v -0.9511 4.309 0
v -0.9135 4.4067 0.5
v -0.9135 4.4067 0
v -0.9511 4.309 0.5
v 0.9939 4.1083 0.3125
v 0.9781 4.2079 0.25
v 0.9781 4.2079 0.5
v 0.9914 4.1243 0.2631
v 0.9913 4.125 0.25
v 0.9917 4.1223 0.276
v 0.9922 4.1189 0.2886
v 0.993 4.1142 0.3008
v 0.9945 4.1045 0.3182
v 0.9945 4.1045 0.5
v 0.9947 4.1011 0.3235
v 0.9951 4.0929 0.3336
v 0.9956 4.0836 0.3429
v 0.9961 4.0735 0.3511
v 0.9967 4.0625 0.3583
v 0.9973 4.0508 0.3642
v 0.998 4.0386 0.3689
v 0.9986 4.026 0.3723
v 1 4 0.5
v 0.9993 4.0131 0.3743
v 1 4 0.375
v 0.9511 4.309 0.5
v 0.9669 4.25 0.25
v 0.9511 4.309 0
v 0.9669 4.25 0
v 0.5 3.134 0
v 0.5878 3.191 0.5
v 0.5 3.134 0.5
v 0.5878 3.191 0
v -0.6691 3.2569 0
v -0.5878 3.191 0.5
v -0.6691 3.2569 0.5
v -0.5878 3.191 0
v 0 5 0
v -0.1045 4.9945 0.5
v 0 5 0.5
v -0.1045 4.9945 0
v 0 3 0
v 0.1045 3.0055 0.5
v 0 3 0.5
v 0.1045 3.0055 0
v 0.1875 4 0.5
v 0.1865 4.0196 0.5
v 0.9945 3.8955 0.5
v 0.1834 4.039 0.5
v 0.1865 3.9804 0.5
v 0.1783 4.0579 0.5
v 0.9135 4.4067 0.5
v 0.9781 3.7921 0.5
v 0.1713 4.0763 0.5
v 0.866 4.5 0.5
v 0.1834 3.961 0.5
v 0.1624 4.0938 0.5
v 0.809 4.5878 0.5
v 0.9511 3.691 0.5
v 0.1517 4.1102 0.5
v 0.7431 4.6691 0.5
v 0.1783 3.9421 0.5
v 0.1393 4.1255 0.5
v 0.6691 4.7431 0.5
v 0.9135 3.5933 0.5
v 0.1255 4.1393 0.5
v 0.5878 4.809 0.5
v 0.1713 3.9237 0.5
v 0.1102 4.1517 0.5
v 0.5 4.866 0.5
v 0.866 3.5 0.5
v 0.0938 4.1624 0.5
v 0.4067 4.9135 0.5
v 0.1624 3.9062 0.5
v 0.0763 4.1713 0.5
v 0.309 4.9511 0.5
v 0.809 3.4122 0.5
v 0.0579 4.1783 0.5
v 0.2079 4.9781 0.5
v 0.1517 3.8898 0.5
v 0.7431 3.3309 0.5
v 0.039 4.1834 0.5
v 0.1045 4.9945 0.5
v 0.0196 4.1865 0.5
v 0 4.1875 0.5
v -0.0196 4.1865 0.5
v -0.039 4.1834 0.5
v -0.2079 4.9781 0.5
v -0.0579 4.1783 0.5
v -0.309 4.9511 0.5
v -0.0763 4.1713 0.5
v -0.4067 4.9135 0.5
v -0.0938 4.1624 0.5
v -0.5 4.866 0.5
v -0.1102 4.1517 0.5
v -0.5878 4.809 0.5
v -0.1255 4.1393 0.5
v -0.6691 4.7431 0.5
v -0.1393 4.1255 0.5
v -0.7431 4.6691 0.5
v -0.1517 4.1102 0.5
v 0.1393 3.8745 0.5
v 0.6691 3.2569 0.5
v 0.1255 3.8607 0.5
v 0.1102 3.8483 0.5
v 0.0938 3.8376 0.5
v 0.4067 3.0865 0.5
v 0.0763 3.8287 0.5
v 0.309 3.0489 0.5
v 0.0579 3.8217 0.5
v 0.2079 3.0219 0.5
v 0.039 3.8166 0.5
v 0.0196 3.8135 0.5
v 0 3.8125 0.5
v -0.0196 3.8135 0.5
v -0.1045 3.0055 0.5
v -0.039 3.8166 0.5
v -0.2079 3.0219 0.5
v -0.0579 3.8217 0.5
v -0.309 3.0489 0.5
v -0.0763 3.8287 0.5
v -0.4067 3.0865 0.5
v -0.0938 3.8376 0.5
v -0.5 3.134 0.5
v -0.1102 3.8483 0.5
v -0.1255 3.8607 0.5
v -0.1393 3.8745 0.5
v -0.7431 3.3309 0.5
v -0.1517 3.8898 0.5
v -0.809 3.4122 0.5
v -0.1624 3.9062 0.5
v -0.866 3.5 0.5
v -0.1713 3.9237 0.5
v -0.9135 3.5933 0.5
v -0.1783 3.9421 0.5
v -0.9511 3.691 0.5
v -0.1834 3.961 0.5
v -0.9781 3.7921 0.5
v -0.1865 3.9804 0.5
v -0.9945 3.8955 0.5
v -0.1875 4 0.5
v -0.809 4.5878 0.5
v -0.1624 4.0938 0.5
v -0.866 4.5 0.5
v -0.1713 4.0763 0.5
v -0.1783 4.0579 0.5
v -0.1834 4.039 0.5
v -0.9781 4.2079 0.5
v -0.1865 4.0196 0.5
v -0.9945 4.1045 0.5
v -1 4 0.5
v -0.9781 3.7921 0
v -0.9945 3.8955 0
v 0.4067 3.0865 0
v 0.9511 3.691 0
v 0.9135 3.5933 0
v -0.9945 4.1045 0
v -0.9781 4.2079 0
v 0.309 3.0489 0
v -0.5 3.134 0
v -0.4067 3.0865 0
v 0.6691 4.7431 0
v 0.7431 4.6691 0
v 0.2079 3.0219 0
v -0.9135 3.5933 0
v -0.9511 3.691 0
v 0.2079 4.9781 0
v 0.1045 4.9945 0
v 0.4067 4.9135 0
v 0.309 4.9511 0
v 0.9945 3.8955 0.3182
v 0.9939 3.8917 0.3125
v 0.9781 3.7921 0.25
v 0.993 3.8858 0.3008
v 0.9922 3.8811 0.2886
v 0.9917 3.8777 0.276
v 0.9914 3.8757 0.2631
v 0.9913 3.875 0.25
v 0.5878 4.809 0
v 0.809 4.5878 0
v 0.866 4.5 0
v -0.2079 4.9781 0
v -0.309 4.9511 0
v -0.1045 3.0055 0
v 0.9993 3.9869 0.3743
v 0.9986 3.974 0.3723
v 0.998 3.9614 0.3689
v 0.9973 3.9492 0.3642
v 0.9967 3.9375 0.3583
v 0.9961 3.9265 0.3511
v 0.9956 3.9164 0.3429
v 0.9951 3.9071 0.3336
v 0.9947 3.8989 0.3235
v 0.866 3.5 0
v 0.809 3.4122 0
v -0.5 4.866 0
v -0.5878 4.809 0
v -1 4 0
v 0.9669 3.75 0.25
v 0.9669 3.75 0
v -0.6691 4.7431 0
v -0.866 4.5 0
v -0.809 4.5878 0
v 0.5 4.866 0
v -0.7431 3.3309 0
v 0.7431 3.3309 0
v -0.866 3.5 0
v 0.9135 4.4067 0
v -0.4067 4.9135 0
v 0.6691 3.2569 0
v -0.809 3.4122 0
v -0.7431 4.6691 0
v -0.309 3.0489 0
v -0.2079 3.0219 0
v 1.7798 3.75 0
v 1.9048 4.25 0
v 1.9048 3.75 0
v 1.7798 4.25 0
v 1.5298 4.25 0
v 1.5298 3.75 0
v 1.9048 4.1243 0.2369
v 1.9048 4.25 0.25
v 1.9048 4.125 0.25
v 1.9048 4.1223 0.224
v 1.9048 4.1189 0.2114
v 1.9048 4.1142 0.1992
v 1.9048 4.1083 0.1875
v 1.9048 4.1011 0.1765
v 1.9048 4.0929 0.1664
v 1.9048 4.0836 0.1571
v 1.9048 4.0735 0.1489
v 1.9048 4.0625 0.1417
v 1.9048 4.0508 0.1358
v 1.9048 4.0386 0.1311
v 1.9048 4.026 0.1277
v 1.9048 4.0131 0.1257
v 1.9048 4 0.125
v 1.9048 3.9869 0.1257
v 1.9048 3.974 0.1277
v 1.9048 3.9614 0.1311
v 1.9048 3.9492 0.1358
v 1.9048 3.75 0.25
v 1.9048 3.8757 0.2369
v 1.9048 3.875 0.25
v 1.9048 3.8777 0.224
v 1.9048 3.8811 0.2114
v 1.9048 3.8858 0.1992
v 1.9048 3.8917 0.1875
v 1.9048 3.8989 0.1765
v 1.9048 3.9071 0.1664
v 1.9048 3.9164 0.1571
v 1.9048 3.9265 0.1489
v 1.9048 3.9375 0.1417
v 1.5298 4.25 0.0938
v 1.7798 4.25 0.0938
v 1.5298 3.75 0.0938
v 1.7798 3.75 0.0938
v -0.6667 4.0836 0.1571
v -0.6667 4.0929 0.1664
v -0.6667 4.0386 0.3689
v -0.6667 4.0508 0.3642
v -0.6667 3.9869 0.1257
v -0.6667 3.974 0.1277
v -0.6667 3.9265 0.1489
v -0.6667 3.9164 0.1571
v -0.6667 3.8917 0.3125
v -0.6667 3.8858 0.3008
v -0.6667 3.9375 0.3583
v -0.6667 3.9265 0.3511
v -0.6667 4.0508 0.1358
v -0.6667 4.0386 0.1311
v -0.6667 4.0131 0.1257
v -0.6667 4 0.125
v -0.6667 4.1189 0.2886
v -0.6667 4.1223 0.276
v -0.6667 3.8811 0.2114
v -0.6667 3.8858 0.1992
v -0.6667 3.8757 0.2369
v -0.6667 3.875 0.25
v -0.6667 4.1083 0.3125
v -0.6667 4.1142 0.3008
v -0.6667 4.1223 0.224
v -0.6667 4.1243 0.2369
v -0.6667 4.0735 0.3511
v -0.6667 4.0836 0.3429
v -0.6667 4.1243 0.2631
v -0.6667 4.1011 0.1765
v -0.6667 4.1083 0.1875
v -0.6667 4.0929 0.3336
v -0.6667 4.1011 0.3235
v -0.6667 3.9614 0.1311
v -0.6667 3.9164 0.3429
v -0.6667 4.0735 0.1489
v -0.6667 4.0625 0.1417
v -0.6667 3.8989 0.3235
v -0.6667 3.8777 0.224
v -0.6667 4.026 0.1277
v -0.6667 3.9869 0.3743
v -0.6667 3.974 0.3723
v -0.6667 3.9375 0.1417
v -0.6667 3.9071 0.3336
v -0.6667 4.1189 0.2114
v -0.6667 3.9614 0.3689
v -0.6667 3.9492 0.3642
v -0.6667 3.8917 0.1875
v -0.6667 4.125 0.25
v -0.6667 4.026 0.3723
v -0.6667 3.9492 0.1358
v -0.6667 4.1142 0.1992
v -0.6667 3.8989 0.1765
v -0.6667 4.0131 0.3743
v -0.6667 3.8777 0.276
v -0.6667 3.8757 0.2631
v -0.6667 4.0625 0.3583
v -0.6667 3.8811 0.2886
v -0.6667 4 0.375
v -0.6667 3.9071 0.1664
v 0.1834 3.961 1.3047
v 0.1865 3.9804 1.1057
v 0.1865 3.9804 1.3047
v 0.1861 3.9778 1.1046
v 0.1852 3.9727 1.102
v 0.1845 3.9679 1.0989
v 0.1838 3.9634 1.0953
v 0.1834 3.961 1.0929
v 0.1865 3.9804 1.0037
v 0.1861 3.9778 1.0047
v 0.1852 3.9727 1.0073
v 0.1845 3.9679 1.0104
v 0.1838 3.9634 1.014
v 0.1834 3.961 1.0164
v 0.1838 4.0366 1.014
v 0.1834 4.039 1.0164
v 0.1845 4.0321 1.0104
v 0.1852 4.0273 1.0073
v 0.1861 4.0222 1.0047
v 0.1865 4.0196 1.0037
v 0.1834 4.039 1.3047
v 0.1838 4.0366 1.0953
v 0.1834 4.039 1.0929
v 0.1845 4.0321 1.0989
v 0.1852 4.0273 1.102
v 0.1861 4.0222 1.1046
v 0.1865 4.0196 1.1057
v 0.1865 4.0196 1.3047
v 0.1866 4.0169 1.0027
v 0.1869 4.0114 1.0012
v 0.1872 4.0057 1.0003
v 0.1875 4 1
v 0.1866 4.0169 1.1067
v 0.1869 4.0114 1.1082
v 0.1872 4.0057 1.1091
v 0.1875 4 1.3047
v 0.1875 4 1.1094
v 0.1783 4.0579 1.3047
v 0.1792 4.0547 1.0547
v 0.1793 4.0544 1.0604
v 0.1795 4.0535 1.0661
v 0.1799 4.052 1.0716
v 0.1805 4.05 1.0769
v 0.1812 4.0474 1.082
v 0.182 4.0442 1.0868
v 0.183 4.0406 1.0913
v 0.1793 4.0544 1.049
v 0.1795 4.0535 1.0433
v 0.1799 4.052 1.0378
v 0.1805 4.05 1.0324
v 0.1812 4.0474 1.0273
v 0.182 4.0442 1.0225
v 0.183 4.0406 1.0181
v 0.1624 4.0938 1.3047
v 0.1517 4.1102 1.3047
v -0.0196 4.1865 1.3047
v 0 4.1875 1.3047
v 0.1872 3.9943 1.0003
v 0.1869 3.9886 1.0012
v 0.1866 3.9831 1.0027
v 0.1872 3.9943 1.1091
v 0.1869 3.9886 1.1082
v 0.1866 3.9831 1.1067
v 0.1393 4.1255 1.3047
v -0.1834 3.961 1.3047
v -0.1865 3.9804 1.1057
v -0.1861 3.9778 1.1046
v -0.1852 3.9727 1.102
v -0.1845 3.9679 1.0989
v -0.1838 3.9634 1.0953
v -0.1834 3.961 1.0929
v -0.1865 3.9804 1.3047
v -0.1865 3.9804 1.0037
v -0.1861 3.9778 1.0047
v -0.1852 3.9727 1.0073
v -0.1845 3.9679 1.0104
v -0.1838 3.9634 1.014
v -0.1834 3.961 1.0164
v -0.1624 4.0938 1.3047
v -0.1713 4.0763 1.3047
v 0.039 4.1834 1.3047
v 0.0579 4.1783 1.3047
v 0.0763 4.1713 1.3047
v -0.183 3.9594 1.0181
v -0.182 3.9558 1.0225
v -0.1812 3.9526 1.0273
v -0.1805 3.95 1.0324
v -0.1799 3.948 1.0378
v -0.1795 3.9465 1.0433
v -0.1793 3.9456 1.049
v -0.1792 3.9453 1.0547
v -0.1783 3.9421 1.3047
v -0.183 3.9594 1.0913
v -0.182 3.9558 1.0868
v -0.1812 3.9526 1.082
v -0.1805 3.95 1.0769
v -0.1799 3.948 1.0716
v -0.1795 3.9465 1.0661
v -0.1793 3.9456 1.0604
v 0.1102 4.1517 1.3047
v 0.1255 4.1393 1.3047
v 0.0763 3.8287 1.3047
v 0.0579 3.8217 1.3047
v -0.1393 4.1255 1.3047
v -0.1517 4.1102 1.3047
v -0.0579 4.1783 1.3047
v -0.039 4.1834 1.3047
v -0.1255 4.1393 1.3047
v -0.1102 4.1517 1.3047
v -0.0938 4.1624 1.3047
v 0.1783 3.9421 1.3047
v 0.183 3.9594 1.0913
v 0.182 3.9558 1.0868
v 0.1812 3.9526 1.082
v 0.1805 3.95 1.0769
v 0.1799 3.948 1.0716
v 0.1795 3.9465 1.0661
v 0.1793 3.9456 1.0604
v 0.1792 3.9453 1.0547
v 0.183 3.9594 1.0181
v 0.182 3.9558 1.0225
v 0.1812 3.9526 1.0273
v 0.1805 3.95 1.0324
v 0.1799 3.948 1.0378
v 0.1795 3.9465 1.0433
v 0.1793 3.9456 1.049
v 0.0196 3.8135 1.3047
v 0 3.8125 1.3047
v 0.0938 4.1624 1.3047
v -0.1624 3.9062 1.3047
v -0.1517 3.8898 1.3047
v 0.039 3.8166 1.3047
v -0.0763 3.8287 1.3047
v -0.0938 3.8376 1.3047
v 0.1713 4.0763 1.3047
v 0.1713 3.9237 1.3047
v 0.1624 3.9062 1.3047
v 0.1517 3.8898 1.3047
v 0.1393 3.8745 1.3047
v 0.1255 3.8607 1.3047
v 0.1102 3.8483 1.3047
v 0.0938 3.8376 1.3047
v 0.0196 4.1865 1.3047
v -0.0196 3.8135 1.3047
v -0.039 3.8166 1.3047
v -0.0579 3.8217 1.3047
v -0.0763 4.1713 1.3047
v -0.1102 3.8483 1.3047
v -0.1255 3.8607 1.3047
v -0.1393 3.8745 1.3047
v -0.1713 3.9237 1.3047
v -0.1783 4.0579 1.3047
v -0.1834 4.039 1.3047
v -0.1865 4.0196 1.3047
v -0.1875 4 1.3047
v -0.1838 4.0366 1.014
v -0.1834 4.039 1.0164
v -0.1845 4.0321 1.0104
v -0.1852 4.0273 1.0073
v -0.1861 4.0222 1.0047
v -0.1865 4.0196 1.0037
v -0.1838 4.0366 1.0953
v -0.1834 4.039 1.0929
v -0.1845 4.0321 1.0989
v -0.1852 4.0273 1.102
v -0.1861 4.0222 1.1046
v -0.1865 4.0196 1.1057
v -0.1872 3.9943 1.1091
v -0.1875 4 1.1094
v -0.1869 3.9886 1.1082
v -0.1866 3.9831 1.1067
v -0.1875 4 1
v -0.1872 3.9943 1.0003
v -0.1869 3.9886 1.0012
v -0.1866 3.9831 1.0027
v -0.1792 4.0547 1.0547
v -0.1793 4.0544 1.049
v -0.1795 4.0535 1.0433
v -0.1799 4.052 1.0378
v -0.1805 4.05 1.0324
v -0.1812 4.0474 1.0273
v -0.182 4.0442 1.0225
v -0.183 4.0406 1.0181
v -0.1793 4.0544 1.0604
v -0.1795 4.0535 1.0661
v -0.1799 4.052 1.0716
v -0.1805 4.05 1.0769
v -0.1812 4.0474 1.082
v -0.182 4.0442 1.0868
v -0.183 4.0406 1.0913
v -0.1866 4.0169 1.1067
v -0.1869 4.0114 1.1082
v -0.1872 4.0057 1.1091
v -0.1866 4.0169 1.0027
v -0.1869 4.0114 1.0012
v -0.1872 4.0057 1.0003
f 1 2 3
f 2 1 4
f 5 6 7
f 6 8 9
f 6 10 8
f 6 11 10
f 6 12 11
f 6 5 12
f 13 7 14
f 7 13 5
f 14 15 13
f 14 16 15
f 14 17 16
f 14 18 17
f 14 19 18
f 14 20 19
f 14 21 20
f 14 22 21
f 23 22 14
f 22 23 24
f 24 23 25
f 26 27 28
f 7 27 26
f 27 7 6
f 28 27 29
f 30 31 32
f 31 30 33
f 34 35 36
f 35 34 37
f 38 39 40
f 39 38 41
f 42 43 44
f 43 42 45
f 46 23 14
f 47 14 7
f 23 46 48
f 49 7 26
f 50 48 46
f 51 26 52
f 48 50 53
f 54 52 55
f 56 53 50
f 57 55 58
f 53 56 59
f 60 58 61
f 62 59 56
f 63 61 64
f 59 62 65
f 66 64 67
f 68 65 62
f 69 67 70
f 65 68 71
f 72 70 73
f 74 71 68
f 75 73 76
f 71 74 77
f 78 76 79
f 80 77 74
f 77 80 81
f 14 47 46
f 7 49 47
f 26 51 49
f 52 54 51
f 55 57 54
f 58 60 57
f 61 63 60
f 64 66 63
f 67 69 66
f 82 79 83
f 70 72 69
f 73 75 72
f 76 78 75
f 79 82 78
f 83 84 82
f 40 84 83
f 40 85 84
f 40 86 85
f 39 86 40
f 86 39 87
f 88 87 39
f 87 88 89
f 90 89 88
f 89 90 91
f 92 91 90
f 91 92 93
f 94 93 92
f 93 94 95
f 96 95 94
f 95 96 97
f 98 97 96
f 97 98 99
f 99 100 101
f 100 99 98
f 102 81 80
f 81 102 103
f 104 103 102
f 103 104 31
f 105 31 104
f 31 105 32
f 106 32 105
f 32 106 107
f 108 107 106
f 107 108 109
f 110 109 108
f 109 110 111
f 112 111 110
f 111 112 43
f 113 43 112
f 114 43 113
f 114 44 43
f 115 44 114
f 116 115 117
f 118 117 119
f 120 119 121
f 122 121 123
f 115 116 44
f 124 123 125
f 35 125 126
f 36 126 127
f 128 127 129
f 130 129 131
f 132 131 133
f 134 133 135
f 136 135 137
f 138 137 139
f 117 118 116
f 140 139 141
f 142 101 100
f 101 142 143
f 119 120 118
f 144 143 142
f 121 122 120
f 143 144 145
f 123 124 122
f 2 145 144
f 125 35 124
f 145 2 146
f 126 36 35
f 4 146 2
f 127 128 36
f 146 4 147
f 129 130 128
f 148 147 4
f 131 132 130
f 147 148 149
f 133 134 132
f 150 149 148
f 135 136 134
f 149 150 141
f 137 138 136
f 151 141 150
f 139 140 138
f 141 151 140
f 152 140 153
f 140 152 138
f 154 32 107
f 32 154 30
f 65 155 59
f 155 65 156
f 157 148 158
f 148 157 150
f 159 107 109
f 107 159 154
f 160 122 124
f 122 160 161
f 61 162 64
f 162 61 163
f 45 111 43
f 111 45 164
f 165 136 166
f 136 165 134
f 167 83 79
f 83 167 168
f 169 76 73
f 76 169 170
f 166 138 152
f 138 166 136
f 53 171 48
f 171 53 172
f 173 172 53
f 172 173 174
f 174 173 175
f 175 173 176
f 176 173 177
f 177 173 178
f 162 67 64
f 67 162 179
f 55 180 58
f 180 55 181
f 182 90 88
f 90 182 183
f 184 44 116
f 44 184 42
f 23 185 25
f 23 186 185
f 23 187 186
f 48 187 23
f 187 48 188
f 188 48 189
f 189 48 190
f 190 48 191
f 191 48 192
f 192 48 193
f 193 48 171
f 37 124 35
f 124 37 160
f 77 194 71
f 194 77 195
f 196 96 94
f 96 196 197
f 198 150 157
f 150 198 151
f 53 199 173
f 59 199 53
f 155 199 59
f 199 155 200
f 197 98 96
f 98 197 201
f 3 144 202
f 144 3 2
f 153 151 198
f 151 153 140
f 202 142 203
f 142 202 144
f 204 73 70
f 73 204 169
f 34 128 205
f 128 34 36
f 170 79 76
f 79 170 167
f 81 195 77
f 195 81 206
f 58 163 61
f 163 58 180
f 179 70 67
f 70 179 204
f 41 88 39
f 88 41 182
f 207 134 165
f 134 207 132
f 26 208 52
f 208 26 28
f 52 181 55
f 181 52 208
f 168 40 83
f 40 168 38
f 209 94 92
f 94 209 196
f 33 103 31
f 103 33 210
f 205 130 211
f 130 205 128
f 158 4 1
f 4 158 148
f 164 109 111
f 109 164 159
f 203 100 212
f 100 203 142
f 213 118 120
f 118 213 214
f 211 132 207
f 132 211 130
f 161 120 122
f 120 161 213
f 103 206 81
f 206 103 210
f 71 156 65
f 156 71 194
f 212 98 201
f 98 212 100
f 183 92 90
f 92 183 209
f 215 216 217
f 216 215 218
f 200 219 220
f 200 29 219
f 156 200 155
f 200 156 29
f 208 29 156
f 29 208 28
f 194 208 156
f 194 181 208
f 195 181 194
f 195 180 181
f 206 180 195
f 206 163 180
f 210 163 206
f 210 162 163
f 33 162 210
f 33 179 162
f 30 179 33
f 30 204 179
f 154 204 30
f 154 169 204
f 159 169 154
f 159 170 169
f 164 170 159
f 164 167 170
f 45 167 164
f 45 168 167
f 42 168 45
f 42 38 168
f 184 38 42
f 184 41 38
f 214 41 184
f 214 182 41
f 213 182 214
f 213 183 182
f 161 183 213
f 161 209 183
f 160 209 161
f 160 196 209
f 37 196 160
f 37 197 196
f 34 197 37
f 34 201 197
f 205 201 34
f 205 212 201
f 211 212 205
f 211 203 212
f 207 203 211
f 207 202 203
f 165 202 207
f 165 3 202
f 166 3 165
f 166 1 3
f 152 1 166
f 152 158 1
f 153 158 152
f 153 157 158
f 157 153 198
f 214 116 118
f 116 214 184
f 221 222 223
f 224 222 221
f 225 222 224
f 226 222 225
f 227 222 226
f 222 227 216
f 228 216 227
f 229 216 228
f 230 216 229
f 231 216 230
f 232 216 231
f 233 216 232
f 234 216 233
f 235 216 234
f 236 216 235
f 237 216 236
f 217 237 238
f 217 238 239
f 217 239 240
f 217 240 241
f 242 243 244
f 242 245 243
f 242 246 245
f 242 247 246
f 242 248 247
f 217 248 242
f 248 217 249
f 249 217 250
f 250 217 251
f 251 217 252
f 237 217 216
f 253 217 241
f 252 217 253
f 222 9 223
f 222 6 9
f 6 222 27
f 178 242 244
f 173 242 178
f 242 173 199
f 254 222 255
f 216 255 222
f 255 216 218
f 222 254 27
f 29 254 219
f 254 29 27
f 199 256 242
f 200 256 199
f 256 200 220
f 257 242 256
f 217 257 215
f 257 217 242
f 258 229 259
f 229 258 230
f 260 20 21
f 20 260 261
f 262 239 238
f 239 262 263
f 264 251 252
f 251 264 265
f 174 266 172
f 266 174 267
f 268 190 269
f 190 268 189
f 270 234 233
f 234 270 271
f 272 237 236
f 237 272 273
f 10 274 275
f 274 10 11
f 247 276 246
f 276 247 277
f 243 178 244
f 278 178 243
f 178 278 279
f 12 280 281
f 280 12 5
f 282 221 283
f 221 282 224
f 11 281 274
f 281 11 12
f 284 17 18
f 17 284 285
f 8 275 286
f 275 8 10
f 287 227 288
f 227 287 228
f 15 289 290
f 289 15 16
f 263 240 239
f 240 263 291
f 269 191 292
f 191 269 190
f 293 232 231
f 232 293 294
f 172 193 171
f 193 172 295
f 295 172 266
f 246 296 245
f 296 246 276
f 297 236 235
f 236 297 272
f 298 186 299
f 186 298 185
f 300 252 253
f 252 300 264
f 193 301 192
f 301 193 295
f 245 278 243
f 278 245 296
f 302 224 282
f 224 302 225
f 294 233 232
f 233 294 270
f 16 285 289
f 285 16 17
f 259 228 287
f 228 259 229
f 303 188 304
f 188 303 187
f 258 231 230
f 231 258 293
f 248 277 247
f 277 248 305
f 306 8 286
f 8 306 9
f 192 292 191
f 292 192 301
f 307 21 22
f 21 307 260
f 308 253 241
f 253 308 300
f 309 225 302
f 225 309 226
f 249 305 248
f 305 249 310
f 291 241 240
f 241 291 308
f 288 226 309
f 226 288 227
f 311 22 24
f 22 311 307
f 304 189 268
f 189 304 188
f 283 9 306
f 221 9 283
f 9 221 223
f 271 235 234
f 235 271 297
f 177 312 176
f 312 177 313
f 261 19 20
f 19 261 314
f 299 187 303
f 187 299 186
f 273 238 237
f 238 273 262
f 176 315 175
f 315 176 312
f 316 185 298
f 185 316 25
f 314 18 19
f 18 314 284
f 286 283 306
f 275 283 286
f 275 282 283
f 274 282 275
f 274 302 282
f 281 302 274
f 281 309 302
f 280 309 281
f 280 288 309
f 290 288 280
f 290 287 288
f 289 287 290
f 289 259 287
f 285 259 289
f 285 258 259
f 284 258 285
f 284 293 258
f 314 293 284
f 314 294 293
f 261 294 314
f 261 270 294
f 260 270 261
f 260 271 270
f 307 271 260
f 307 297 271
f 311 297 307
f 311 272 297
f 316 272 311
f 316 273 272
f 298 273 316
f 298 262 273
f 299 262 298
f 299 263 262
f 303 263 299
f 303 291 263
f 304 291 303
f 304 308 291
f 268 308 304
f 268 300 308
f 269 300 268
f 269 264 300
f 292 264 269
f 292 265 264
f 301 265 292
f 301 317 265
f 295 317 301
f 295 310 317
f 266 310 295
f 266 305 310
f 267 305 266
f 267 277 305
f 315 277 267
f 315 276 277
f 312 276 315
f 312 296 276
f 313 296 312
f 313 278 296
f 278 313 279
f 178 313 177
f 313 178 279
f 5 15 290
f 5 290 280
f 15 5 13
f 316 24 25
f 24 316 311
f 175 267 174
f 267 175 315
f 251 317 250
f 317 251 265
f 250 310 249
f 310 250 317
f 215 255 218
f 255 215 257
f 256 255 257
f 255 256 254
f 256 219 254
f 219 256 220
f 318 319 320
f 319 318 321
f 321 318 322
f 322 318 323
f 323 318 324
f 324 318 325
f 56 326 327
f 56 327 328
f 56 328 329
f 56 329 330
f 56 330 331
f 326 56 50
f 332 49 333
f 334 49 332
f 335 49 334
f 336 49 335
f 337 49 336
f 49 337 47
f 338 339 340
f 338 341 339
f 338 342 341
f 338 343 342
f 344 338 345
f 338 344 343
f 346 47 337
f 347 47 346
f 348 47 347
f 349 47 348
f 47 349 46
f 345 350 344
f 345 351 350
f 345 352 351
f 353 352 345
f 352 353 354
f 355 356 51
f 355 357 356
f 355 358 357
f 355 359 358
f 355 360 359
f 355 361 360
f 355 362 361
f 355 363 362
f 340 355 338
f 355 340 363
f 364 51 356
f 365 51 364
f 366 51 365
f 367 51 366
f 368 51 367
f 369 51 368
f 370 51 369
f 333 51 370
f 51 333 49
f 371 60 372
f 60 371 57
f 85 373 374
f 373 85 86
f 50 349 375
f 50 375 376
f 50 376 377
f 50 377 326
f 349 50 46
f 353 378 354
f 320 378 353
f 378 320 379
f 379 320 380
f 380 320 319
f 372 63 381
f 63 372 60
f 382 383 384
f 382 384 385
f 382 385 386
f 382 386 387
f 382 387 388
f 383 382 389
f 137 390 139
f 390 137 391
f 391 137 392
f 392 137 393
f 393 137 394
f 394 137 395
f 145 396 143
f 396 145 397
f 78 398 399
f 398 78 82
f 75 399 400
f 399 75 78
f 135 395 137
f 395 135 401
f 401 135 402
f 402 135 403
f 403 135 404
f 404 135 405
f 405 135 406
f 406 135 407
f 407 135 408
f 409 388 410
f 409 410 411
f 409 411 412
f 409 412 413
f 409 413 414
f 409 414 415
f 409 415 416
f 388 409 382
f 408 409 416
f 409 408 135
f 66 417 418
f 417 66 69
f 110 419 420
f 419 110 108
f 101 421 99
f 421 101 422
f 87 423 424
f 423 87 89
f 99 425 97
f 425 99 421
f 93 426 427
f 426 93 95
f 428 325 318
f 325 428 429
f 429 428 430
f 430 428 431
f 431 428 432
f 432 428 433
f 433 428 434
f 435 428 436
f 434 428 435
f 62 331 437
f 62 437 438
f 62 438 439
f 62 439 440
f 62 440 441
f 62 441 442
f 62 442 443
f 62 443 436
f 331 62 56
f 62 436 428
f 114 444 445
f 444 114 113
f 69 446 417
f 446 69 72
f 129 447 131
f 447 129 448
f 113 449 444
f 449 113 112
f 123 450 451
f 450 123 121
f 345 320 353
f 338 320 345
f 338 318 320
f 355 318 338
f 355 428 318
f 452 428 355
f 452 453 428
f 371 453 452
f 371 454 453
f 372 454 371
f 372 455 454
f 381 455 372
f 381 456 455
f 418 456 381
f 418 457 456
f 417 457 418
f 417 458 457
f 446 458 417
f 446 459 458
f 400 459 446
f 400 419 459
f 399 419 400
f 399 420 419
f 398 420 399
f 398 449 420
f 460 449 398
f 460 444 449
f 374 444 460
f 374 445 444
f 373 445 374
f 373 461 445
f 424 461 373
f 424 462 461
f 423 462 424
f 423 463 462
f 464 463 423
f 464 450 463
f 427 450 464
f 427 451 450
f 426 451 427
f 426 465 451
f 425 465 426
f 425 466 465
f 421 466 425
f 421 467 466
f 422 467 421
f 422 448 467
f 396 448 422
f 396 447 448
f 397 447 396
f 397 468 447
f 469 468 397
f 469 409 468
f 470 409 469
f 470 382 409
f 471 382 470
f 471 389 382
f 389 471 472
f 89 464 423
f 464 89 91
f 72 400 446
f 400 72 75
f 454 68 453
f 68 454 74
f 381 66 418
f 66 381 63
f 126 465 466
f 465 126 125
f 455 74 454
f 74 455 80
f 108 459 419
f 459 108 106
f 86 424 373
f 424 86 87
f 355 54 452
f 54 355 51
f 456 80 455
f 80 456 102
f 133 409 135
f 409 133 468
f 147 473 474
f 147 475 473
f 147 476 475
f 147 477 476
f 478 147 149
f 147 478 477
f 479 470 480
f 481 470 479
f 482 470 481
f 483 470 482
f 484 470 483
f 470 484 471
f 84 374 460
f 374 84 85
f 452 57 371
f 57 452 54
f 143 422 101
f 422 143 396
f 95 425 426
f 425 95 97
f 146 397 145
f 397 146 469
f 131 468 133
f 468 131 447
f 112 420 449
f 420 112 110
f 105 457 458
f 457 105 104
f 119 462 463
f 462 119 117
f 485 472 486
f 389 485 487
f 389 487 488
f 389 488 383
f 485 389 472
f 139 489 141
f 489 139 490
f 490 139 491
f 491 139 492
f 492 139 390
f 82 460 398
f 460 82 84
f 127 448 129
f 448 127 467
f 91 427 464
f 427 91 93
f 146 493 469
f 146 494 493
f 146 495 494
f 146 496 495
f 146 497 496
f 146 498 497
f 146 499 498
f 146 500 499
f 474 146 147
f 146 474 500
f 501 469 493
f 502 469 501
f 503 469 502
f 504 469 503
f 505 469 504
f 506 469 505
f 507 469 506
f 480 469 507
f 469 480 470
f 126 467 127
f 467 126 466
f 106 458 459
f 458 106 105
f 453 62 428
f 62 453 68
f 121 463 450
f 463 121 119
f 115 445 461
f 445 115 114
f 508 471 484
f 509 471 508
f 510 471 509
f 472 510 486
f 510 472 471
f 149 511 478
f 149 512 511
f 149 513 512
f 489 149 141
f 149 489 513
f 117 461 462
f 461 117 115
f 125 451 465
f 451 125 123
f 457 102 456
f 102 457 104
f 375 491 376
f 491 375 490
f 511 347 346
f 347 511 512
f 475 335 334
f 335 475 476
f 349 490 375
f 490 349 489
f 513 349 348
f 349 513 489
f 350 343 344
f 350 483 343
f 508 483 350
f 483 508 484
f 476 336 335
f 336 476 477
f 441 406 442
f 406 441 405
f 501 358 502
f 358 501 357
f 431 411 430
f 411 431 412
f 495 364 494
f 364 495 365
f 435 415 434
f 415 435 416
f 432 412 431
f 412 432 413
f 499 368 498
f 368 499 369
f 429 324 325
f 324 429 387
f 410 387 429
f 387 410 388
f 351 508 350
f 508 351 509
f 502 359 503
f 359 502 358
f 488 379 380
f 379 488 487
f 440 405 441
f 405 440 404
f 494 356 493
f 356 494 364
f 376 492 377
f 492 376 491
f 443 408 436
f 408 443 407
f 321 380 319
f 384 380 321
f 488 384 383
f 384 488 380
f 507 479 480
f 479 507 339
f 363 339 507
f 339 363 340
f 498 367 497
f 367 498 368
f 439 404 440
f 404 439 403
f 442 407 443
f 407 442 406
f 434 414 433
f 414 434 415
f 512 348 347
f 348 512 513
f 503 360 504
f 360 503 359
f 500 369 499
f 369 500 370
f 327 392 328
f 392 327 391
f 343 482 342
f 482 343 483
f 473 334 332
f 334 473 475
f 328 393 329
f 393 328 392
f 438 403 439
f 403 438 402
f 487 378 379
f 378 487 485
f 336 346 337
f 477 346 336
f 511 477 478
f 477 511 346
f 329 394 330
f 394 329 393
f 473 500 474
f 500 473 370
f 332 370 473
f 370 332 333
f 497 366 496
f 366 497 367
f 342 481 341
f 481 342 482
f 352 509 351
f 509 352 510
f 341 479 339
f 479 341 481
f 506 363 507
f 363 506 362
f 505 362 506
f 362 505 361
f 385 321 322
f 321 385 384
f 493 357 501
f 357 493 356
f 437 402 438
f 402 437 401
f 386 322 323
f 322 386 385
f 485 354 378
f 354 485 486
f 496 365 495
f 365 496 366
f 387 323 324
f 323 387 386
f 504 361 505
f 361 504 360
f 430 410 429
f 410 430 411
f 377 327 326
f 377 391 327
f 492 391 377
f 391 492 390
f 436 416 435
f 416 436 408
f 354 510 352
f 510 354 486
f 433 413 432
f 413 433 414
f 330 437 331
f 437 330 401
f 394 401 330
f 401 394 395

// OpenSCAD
$fn = 60;

rotor_dia = 2;
rotor_dome_rad = 3/8;
pole_dia = 1/4;
rotor_thickness = 1/2;
pole_depth = 2/3;
  // As a fraction of rotor_dia

pole_flange_length = rotor_dia/2;
pole_flange_width = pole_dia*2;
pole_flange_height = rotor_thickness/2;

ubolt_notch = [ 0.25, pole_flange_width, 3/32 ];
ubolt_notch_inset = 0.125;

axle_dia = 3/8;
axle_clearance = 0.01;
axle_cotter_inset = 0.25;
axle_cotter_dia = 7/64;
axle_length = axle_cotter_inset 
               + axle_cotter_dia/2
               + rotor_thickness;

module rotor_assembly() {
  difference () 
  {
    union() {
      cylinder( d = rotor_dia, 
                h = rotor_thickness, 
                center = false );
        translate([rotor_dia/2-rotor_dia/21, 
                   -pole_flange_width/2, 
                   0])
          cube([pole_flange_length, 
                pole_flange_width, 
                pole_flange_height],
               center = false );
      }
      translate( [-pole_depth*rotor_dia/2, 
                 0, 
                 rotor_thickness/2] )
        rotate( [0, 90, 0] )
          cylinder( d = pole_dia, 
                    h = rotor_dia+pole_flange_length, 
                    center = false );
      translate( [rotor_dia/2-rotor_dia/21+pole_flange_length-ubolt_notch_inset-ubolt_notch.x, 
                 -ubolt_notch.y/2, 
                 0] )
      cube(ubolt_notch, center = false);
    }
    
    difference () 
    {
      translate([0, 0, rotor_thickness])
        cylinder( d = axle_dia, 
                  h = axle_length, 
                  center = false );
              
      translate( [-axle_dia/2, 
                 0, 
                 axle_length 
                  + rotor_thickness 
                  - axle_cotter_inset] )
        rotate( [0, 90, 0] )
          cylinder( d = axle_cotter_dia, 
                    h = axle_dia, 
                    center = false );
    }
  }

translate( [0, rotor_dia*2, 0])
  rotor_assembly();
